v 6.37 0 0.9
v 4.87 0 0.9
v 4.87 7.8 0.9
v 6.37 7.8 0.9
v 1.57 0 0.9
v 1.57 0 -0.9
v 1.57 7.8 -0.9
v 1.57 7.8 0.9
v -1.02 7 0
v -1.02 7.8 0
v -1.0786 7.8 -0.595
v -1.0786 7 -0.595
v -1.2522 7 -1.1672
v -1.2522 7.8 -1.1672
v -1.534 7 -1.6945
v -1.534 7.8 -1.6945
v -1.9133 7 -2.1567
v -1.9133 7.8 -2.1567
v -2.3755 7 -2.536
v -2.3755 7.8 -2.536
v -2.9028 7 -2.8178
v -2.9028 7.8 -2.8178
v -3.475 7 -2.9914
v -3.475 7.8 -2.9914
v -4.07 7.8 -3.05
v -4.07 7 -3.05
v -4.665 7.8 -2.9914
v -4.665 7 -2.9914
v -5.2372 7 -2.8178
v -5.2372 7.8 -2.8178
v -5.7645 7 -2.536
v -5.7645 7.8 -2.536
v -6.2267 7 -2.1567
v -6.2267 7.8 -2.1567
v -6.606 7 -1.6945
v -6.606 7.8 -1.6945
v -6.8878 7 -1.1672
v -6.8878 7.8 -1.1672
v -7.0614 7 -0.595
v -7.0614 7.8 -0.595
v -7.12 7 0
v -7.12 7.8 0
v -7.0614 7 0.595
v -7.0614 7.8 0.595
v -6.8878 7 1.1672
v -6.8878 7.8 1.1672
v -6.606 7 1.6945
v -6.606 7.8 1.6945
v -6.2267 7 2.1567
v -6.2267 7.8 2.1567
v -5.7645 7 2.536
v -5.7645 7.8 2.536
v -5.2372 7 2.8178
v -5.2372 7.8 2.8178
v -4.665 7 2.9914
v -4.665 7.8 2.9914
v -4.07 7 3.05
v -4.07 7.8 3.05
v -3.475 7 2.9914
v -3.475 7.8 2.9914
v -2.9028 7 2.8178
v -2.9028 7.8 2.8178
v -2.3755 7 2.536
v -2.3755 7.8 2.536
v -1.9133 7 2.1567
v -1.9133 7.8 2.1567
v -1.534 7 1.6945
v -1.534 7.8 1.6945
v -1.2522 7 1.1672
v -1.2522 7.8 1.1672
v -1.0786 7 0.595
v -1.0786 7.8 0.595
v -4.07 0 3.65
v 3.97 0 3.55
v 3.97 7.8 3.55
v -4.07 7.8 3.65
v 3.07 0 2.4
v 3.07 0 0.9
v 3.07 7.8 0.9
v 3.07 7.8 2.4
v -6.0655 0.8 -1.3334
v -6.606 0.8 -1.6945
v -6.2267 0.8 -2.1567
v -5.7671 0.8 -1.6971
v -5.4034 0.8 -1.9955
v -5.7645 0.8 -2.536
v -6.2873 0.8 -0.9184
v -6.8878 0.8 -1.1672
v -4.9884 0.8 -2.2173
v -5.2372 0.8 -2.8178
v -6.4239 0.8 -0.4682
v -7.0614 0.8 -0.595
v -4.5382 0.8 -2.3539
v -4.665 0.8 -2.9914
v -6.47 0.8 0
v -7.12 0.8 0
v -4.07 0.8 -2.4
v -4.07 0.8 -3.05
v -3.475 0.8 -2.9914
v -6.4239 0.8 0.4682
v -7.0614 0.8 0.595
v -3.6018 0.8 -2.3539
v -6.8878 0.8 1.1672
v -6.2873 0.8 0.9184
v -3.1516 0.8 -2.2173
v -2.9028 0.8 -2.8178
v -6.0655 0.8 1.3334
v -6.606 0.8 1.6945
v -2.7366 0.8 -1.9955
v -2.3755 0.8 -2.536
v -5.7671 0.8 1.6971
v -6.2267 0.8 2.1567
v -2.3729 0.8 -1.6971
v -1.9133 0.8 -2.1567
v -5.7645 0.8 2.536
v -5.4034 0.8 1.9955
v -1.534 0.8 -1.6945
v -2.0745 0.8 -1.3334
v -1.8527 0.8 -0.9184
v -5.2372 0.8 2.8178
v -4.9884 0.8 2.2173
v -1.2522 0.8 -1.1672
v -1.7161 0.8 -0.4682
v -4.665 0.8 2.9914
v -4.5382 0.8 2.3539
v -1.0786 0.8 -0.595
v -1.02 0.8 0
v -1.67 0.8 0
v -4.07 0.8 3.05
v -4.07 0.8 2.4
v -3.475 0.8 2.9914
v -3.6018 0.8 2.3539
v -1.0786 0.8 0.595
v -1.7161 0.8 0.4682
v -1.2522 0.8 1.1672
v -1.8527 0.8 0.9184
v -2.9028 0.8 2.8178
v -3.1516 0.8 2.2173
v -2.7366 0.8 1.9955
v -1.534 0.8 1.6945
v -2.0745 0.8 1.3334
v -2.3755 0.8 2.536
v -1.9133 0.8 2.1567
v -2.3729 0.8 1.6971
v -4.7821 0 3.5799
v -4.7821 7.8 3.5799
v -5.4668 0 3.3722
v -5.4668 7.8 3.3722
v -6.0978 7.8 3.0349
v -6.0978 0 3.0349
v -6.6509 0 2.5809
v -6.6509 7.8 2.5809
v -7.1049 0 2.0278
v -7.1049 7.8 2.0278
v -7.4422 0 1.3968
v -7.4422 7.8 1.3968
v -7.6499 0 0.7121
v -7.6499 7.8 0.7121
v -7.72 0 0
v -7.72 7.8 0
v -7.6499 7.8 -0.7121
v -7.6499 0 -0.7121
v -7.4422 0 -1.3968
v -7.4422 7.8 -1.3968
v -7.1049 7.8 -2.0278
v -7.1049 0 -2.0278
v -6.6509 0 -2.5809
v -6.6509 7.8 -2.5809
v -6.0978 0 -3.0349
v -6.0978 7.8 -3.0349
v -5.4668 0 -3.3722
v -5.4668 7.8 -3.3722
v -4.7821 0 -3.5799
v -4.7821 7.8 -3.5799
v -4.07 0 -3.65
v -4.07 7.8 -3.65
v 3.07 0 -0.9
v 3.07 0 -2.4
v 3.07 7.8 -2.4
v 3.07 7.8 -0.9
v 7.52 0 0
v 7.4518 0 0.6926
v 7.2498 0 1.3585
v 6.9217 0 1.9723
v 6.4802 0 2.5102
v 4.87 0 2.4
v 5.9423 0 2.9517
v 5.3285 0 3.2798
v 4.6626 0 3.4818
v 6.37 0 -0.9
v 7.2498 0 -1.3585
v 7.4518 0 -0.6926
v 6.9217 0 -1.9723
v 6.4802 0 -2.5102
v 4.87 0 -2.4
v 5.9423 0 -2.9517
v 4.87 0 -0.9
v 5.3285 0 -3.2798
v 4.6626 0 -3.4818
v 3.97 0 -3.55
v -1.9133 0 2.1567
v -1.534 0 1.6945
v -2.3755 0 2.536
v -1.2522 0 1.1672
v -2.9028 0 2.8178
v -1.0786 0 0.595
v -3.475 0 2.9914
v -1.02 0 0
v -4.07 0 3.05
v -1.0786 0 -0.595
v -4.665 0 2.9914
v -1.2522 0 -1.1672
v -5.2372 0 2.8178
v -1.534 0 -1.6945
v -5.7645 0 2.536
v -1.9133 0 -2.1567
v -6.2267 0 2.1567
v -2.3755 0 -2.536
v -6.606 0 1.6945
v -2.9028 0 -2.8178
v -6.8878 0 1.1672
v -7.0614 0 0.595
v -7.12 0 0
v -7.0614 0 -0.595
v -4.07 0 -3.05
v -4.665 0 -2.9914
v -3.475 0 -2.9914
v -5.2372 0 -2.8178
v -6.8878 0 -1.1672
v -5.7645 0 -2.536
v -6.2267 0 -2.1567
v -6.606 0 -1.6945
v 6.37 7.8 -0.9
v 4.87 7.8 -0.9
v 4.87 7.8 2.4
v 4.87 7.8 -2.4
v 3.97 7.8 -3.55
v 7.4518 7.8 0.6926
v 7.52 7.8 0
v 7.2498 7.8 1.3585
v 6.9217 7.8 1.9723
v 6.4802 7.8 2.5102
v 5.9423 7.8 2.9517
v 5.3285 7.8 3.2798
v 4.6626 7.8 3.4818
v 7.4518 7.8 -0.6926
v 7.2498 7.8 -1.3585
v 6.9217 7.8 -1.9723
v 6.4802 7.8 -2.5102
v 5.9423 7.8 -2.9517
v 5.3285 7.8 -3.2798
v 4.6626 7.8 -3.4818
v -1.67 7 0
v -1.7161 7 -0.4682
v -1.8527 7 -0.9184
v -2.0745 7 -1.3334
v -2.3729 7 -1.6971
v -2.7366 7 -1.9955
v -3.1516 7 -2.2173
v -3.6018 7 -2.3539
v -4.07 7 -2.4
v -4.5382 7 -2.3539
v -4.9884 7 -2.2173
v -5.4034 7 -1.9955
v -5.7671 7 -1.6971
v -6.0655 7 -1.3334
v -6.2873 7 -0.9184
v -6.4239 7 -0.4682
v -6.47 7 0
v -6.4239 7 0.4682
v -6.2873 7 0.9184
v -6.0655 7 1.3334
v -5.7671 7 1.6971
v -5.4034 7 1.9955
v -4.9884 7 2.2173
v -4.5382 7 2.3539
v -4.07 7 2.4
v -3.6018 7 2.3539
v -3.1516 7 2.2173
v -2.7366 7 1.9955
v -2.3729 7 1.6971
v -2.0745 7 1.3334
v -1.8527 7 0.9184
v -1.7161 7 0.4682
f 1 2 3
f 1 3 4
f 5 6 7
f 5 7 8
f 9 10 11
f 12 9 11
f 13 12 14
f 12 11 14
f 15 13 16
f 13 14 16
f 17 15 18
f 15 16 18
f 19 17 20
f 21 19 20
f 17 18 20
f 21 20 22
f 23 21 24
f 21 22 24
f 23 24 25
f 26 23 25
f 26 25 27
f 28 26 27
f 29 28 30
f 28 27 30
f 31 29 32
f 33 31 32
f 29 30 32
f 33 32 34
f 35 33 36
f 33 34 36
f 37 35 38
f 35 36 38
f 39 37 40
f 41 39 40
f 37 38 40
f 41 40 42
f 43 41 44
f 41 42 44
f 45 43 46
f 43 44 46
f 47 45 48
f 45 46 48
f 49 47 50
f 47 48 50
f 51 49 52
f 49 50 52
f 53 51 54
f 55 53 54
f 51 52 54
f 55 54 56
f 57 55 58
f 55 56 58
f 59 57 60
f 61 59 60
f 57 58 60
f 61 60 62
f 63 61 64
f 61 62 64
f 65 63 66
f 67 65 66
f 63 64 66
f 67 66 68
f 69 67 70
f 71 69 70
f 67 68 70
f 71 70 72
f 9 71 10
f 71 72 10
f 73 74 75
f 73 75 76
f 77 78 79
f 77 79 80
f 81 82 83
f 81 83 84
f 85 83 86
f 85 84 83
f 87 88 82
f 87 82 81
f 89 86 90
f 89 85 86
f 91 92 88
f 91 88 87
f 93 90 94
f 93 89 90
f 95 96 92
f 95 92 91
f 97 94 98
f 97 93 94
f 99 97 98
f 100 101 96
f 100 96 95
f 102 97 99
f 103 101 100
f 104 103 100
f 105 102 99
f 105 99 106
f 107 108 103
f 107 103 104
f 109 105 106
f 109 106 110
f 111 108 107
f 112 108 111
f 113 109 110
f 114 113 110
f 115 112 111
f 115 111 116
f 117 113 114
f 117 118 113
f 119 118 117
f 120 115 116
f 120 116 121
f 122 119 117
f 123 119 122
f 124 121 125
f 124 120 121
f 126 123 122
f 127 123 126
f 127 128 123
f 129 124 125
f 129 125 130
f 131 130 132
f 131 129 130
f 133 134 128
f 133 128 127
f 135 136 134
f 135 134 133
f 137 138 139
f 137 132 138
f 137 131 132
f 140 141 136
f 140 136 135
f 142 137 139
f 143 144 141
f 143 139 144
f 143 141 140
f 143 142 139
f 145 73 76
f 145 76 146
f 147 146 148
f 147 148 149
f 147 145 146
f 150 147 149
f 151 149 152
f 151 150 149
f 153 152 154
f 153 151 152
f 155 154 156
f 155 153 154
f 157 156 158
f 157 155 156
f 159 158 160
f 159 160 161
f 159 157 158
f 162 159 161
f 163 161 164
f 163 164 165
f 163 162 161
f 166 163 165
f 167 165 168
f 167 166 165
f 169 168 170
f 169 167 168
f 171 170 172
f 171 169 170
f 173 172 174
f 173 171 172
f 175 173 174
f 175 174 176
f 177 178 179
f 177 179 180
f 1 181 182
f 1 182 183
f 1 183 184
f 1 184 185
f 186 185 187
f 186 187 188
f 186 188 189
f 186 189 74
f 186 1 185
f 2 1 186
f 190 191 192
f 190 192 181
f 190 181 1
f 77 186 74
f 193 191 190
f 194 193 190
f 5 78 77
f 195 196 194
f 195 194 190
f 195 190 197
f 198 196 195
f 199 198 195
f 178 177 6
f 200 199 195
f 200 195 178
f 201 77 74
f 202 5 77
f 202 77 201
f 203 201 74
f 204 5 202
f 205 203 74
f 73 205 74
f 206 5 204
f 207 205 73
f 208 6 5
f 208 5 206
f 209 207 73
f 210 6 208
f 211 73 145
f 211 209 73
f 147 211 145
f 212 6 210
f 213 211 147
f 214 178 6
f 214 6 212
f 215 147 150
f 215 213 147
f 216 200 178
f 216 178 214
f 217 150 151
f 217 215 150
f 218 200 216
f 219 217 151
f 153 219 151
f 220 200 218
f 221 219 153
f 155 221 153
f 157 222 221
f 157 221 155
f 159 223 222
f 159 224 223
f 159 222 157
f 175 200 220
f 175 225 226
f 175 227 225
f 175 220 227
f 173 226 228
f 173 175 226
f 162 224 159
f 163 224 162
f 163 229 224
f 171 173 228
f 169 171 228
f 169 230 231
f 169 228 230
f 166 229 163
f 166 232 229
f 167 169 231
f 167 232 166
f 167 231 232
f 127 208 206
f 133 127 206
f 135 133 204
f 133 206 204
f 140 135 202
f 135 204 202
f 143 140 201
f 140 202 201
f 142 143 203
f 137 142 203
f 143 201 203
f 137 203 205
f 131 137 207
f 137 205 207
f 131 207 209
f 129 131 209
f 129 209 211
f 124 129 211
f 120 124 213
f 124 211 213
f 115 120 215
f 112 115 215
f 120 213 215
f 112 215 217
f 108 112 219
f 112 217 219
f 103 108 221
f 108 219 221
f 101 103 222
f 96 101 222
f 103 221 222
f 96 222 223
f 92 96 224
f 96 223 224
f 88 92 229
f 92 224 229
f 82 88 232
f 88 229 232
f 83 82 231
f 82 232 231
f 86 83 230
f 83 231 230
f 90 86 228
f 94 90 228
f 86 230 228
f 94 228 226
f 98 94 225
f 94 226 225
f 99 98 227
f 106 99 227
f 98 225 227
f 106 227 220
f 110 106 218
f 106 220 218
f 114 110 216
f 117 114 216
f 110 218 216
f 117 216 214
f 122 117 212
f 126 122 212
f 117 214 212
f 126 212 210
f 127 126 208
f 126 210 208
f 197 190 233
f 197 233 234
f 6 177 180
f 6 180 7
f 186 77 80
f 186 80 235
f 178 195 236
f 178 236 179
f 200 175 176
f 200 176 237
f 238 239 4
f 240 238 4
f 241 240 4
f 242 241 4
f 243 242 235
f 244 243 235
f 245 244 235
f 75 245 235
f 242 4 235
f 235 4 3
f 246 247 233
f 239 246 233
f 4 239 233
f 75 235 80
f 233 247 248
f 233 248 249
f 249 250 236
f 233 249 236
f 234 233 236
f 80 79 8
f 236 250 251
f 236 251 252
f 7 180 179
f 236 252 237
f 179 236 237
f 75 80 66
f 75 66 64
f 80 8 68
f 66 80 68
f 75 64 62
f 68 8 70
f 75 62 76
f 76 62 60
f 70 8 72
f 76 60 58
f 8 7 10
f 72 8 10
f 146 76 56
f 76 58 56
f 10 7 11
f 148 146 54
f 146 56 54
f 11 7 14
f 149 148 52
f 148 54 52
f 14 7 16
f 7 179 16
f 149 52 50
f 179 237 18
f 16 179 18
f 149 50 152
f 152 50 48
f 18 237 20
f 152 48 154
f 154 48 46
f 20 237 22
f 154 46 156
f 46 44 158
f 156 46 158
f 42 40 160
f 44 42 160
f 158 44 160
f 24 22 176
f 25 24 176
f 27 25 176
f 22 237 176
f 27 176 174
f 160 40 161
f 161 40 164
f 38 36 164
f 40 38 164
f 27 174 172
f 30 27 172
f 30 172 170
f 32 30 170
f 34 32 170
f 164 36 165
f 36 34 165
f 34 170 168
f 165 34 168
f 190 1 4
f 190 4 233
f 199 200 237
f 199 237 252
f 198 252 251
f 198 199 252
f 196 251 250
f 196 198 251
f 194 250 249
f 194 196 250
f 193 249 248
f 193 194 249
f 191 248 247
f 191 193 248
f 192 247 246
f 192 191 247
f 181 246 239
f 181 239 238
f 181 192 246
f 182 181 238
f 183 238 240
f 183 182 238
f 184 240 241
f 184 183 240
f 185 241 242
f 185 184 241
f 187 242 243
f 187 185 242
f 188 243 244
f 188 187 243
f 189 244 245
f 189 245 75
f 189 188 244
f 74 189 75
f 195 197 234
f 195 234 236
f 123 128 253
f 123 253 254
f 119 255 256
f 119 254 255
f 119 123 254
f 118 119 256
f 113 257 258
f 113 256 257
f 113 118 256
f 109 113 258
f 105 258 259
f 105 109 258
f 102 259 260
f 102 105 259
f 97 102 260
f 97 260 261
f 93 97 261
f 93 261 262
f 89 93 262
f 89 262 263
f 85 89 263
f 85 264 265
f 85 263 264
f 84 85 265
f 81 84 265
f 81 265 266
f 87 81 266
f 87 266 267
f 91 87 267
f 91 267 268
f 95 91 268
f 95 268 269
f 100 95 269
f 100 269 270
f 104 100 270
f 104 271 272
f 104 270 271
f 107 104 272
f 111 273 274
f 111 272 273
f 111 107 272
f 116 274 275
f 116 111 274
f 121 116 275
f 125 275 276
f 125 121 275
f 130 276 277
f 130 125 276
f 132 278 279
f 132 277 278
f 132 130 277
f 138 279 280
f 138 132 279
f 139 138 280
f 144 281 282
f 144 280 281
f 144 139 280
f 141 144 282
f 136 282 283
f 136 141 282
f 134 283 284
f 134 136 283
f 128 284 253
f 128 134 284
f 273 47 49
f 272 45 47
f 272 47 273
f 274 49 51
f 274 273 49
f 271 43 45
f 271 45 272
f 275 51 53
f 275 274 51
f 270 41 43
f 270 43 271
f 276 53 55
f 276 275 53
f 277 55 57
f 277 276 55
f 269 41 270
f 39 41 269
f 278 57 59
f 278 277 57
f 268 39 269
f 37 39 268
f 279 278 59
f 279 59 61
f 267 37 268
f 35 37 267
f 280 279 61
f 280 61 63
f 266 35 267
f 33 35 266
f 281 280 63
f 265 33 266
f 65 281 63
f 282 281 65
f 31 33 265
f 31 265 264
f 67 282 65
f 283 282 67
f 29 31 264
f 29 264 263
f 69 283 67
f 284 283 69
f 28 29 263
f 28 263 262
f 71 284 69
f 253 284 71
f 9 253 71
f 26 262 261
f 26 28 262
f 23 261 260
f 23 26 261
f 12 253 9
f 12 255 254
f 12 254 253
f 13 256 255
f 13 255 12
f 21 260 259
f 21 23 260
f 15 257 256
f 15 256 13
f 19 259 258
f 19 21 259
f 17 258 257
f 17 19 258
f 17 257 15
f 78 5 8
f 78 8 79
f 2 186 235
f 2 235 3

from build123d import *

# Parameters (mm, degrees)
SKETCH1_R           = 2.4
BOSS_EXTRUDE1_DEPTH = 7.8
SKETCH2_R           = 3.05
CUT_EXTRUDE1_DEPTH  = 0.8
SKETCH3_R           = 3.05
CUT_EXTRUDE2_DEPTH  = 0.8


with BuildPart() as part:
    # Sketch1 → Boss-Extrude1 (new body)
    with BuildSketch(Plane(origin=(0, 0, 0), x_dir=(1, 0, 0), z_dir=(0, 1, 0))):
        with BuildLine():
            Line((-4.07, 3.65), (3.97, 3.55))
            ThreePointArc((3.97, 3.55), (7.52, 0), (3.97, -3.55))
            Line((3.97, -3.55), (-4.07, -3.65))
            ThreePointArc((-4.07, -3.65), (-7.72, 0), (-4.07, 3.65))
        make_face()
        with Locations((-4.07, 0)):
            Circle(SKETCH1_R, mode=Mode.SUBTRACT)
        Polygon((3.07, 2.4), (3.07, 0.9), (1.57, 0.9), (1.57, -0.9), (3.07, -0.9), (3.07, -2.4), (4.87, -2.4), (4.87, -0.9), (6.37, -0.9), (6.37, 0.9), (4.87, 0.9), (4.87, 2.4), align=None, mode=Mode.SUBTRACT)
    extrude(amount=BOSS_EXTRUDE1_DEPTH)

    # Sketch2 → Cut-Extrude1 (cut)
    with BuildSketch(Plane(origin=(0, 7.8, 0), x_dir=(1, 0, 0), z_dir=(0, 1, 0))):
        with Locations((-4.07, 0)):
            Circle(SKETCH2_R)
    extrude(amount=-CUT_EXTRUDE1_DEPTH, mode=Mode.SUBTRACT)

    # Sketch3 → Cut-Extrude2 (cut)
    with BuildSketch(Plane.XZ):
        with Locations((-4.07, 0)):
            Circle(SKETCH3_R)
    extrude(amount=-CUT_EXTRUDE2_DEPTH, mode=Mode.SUBTRACT)


solid = part.part
